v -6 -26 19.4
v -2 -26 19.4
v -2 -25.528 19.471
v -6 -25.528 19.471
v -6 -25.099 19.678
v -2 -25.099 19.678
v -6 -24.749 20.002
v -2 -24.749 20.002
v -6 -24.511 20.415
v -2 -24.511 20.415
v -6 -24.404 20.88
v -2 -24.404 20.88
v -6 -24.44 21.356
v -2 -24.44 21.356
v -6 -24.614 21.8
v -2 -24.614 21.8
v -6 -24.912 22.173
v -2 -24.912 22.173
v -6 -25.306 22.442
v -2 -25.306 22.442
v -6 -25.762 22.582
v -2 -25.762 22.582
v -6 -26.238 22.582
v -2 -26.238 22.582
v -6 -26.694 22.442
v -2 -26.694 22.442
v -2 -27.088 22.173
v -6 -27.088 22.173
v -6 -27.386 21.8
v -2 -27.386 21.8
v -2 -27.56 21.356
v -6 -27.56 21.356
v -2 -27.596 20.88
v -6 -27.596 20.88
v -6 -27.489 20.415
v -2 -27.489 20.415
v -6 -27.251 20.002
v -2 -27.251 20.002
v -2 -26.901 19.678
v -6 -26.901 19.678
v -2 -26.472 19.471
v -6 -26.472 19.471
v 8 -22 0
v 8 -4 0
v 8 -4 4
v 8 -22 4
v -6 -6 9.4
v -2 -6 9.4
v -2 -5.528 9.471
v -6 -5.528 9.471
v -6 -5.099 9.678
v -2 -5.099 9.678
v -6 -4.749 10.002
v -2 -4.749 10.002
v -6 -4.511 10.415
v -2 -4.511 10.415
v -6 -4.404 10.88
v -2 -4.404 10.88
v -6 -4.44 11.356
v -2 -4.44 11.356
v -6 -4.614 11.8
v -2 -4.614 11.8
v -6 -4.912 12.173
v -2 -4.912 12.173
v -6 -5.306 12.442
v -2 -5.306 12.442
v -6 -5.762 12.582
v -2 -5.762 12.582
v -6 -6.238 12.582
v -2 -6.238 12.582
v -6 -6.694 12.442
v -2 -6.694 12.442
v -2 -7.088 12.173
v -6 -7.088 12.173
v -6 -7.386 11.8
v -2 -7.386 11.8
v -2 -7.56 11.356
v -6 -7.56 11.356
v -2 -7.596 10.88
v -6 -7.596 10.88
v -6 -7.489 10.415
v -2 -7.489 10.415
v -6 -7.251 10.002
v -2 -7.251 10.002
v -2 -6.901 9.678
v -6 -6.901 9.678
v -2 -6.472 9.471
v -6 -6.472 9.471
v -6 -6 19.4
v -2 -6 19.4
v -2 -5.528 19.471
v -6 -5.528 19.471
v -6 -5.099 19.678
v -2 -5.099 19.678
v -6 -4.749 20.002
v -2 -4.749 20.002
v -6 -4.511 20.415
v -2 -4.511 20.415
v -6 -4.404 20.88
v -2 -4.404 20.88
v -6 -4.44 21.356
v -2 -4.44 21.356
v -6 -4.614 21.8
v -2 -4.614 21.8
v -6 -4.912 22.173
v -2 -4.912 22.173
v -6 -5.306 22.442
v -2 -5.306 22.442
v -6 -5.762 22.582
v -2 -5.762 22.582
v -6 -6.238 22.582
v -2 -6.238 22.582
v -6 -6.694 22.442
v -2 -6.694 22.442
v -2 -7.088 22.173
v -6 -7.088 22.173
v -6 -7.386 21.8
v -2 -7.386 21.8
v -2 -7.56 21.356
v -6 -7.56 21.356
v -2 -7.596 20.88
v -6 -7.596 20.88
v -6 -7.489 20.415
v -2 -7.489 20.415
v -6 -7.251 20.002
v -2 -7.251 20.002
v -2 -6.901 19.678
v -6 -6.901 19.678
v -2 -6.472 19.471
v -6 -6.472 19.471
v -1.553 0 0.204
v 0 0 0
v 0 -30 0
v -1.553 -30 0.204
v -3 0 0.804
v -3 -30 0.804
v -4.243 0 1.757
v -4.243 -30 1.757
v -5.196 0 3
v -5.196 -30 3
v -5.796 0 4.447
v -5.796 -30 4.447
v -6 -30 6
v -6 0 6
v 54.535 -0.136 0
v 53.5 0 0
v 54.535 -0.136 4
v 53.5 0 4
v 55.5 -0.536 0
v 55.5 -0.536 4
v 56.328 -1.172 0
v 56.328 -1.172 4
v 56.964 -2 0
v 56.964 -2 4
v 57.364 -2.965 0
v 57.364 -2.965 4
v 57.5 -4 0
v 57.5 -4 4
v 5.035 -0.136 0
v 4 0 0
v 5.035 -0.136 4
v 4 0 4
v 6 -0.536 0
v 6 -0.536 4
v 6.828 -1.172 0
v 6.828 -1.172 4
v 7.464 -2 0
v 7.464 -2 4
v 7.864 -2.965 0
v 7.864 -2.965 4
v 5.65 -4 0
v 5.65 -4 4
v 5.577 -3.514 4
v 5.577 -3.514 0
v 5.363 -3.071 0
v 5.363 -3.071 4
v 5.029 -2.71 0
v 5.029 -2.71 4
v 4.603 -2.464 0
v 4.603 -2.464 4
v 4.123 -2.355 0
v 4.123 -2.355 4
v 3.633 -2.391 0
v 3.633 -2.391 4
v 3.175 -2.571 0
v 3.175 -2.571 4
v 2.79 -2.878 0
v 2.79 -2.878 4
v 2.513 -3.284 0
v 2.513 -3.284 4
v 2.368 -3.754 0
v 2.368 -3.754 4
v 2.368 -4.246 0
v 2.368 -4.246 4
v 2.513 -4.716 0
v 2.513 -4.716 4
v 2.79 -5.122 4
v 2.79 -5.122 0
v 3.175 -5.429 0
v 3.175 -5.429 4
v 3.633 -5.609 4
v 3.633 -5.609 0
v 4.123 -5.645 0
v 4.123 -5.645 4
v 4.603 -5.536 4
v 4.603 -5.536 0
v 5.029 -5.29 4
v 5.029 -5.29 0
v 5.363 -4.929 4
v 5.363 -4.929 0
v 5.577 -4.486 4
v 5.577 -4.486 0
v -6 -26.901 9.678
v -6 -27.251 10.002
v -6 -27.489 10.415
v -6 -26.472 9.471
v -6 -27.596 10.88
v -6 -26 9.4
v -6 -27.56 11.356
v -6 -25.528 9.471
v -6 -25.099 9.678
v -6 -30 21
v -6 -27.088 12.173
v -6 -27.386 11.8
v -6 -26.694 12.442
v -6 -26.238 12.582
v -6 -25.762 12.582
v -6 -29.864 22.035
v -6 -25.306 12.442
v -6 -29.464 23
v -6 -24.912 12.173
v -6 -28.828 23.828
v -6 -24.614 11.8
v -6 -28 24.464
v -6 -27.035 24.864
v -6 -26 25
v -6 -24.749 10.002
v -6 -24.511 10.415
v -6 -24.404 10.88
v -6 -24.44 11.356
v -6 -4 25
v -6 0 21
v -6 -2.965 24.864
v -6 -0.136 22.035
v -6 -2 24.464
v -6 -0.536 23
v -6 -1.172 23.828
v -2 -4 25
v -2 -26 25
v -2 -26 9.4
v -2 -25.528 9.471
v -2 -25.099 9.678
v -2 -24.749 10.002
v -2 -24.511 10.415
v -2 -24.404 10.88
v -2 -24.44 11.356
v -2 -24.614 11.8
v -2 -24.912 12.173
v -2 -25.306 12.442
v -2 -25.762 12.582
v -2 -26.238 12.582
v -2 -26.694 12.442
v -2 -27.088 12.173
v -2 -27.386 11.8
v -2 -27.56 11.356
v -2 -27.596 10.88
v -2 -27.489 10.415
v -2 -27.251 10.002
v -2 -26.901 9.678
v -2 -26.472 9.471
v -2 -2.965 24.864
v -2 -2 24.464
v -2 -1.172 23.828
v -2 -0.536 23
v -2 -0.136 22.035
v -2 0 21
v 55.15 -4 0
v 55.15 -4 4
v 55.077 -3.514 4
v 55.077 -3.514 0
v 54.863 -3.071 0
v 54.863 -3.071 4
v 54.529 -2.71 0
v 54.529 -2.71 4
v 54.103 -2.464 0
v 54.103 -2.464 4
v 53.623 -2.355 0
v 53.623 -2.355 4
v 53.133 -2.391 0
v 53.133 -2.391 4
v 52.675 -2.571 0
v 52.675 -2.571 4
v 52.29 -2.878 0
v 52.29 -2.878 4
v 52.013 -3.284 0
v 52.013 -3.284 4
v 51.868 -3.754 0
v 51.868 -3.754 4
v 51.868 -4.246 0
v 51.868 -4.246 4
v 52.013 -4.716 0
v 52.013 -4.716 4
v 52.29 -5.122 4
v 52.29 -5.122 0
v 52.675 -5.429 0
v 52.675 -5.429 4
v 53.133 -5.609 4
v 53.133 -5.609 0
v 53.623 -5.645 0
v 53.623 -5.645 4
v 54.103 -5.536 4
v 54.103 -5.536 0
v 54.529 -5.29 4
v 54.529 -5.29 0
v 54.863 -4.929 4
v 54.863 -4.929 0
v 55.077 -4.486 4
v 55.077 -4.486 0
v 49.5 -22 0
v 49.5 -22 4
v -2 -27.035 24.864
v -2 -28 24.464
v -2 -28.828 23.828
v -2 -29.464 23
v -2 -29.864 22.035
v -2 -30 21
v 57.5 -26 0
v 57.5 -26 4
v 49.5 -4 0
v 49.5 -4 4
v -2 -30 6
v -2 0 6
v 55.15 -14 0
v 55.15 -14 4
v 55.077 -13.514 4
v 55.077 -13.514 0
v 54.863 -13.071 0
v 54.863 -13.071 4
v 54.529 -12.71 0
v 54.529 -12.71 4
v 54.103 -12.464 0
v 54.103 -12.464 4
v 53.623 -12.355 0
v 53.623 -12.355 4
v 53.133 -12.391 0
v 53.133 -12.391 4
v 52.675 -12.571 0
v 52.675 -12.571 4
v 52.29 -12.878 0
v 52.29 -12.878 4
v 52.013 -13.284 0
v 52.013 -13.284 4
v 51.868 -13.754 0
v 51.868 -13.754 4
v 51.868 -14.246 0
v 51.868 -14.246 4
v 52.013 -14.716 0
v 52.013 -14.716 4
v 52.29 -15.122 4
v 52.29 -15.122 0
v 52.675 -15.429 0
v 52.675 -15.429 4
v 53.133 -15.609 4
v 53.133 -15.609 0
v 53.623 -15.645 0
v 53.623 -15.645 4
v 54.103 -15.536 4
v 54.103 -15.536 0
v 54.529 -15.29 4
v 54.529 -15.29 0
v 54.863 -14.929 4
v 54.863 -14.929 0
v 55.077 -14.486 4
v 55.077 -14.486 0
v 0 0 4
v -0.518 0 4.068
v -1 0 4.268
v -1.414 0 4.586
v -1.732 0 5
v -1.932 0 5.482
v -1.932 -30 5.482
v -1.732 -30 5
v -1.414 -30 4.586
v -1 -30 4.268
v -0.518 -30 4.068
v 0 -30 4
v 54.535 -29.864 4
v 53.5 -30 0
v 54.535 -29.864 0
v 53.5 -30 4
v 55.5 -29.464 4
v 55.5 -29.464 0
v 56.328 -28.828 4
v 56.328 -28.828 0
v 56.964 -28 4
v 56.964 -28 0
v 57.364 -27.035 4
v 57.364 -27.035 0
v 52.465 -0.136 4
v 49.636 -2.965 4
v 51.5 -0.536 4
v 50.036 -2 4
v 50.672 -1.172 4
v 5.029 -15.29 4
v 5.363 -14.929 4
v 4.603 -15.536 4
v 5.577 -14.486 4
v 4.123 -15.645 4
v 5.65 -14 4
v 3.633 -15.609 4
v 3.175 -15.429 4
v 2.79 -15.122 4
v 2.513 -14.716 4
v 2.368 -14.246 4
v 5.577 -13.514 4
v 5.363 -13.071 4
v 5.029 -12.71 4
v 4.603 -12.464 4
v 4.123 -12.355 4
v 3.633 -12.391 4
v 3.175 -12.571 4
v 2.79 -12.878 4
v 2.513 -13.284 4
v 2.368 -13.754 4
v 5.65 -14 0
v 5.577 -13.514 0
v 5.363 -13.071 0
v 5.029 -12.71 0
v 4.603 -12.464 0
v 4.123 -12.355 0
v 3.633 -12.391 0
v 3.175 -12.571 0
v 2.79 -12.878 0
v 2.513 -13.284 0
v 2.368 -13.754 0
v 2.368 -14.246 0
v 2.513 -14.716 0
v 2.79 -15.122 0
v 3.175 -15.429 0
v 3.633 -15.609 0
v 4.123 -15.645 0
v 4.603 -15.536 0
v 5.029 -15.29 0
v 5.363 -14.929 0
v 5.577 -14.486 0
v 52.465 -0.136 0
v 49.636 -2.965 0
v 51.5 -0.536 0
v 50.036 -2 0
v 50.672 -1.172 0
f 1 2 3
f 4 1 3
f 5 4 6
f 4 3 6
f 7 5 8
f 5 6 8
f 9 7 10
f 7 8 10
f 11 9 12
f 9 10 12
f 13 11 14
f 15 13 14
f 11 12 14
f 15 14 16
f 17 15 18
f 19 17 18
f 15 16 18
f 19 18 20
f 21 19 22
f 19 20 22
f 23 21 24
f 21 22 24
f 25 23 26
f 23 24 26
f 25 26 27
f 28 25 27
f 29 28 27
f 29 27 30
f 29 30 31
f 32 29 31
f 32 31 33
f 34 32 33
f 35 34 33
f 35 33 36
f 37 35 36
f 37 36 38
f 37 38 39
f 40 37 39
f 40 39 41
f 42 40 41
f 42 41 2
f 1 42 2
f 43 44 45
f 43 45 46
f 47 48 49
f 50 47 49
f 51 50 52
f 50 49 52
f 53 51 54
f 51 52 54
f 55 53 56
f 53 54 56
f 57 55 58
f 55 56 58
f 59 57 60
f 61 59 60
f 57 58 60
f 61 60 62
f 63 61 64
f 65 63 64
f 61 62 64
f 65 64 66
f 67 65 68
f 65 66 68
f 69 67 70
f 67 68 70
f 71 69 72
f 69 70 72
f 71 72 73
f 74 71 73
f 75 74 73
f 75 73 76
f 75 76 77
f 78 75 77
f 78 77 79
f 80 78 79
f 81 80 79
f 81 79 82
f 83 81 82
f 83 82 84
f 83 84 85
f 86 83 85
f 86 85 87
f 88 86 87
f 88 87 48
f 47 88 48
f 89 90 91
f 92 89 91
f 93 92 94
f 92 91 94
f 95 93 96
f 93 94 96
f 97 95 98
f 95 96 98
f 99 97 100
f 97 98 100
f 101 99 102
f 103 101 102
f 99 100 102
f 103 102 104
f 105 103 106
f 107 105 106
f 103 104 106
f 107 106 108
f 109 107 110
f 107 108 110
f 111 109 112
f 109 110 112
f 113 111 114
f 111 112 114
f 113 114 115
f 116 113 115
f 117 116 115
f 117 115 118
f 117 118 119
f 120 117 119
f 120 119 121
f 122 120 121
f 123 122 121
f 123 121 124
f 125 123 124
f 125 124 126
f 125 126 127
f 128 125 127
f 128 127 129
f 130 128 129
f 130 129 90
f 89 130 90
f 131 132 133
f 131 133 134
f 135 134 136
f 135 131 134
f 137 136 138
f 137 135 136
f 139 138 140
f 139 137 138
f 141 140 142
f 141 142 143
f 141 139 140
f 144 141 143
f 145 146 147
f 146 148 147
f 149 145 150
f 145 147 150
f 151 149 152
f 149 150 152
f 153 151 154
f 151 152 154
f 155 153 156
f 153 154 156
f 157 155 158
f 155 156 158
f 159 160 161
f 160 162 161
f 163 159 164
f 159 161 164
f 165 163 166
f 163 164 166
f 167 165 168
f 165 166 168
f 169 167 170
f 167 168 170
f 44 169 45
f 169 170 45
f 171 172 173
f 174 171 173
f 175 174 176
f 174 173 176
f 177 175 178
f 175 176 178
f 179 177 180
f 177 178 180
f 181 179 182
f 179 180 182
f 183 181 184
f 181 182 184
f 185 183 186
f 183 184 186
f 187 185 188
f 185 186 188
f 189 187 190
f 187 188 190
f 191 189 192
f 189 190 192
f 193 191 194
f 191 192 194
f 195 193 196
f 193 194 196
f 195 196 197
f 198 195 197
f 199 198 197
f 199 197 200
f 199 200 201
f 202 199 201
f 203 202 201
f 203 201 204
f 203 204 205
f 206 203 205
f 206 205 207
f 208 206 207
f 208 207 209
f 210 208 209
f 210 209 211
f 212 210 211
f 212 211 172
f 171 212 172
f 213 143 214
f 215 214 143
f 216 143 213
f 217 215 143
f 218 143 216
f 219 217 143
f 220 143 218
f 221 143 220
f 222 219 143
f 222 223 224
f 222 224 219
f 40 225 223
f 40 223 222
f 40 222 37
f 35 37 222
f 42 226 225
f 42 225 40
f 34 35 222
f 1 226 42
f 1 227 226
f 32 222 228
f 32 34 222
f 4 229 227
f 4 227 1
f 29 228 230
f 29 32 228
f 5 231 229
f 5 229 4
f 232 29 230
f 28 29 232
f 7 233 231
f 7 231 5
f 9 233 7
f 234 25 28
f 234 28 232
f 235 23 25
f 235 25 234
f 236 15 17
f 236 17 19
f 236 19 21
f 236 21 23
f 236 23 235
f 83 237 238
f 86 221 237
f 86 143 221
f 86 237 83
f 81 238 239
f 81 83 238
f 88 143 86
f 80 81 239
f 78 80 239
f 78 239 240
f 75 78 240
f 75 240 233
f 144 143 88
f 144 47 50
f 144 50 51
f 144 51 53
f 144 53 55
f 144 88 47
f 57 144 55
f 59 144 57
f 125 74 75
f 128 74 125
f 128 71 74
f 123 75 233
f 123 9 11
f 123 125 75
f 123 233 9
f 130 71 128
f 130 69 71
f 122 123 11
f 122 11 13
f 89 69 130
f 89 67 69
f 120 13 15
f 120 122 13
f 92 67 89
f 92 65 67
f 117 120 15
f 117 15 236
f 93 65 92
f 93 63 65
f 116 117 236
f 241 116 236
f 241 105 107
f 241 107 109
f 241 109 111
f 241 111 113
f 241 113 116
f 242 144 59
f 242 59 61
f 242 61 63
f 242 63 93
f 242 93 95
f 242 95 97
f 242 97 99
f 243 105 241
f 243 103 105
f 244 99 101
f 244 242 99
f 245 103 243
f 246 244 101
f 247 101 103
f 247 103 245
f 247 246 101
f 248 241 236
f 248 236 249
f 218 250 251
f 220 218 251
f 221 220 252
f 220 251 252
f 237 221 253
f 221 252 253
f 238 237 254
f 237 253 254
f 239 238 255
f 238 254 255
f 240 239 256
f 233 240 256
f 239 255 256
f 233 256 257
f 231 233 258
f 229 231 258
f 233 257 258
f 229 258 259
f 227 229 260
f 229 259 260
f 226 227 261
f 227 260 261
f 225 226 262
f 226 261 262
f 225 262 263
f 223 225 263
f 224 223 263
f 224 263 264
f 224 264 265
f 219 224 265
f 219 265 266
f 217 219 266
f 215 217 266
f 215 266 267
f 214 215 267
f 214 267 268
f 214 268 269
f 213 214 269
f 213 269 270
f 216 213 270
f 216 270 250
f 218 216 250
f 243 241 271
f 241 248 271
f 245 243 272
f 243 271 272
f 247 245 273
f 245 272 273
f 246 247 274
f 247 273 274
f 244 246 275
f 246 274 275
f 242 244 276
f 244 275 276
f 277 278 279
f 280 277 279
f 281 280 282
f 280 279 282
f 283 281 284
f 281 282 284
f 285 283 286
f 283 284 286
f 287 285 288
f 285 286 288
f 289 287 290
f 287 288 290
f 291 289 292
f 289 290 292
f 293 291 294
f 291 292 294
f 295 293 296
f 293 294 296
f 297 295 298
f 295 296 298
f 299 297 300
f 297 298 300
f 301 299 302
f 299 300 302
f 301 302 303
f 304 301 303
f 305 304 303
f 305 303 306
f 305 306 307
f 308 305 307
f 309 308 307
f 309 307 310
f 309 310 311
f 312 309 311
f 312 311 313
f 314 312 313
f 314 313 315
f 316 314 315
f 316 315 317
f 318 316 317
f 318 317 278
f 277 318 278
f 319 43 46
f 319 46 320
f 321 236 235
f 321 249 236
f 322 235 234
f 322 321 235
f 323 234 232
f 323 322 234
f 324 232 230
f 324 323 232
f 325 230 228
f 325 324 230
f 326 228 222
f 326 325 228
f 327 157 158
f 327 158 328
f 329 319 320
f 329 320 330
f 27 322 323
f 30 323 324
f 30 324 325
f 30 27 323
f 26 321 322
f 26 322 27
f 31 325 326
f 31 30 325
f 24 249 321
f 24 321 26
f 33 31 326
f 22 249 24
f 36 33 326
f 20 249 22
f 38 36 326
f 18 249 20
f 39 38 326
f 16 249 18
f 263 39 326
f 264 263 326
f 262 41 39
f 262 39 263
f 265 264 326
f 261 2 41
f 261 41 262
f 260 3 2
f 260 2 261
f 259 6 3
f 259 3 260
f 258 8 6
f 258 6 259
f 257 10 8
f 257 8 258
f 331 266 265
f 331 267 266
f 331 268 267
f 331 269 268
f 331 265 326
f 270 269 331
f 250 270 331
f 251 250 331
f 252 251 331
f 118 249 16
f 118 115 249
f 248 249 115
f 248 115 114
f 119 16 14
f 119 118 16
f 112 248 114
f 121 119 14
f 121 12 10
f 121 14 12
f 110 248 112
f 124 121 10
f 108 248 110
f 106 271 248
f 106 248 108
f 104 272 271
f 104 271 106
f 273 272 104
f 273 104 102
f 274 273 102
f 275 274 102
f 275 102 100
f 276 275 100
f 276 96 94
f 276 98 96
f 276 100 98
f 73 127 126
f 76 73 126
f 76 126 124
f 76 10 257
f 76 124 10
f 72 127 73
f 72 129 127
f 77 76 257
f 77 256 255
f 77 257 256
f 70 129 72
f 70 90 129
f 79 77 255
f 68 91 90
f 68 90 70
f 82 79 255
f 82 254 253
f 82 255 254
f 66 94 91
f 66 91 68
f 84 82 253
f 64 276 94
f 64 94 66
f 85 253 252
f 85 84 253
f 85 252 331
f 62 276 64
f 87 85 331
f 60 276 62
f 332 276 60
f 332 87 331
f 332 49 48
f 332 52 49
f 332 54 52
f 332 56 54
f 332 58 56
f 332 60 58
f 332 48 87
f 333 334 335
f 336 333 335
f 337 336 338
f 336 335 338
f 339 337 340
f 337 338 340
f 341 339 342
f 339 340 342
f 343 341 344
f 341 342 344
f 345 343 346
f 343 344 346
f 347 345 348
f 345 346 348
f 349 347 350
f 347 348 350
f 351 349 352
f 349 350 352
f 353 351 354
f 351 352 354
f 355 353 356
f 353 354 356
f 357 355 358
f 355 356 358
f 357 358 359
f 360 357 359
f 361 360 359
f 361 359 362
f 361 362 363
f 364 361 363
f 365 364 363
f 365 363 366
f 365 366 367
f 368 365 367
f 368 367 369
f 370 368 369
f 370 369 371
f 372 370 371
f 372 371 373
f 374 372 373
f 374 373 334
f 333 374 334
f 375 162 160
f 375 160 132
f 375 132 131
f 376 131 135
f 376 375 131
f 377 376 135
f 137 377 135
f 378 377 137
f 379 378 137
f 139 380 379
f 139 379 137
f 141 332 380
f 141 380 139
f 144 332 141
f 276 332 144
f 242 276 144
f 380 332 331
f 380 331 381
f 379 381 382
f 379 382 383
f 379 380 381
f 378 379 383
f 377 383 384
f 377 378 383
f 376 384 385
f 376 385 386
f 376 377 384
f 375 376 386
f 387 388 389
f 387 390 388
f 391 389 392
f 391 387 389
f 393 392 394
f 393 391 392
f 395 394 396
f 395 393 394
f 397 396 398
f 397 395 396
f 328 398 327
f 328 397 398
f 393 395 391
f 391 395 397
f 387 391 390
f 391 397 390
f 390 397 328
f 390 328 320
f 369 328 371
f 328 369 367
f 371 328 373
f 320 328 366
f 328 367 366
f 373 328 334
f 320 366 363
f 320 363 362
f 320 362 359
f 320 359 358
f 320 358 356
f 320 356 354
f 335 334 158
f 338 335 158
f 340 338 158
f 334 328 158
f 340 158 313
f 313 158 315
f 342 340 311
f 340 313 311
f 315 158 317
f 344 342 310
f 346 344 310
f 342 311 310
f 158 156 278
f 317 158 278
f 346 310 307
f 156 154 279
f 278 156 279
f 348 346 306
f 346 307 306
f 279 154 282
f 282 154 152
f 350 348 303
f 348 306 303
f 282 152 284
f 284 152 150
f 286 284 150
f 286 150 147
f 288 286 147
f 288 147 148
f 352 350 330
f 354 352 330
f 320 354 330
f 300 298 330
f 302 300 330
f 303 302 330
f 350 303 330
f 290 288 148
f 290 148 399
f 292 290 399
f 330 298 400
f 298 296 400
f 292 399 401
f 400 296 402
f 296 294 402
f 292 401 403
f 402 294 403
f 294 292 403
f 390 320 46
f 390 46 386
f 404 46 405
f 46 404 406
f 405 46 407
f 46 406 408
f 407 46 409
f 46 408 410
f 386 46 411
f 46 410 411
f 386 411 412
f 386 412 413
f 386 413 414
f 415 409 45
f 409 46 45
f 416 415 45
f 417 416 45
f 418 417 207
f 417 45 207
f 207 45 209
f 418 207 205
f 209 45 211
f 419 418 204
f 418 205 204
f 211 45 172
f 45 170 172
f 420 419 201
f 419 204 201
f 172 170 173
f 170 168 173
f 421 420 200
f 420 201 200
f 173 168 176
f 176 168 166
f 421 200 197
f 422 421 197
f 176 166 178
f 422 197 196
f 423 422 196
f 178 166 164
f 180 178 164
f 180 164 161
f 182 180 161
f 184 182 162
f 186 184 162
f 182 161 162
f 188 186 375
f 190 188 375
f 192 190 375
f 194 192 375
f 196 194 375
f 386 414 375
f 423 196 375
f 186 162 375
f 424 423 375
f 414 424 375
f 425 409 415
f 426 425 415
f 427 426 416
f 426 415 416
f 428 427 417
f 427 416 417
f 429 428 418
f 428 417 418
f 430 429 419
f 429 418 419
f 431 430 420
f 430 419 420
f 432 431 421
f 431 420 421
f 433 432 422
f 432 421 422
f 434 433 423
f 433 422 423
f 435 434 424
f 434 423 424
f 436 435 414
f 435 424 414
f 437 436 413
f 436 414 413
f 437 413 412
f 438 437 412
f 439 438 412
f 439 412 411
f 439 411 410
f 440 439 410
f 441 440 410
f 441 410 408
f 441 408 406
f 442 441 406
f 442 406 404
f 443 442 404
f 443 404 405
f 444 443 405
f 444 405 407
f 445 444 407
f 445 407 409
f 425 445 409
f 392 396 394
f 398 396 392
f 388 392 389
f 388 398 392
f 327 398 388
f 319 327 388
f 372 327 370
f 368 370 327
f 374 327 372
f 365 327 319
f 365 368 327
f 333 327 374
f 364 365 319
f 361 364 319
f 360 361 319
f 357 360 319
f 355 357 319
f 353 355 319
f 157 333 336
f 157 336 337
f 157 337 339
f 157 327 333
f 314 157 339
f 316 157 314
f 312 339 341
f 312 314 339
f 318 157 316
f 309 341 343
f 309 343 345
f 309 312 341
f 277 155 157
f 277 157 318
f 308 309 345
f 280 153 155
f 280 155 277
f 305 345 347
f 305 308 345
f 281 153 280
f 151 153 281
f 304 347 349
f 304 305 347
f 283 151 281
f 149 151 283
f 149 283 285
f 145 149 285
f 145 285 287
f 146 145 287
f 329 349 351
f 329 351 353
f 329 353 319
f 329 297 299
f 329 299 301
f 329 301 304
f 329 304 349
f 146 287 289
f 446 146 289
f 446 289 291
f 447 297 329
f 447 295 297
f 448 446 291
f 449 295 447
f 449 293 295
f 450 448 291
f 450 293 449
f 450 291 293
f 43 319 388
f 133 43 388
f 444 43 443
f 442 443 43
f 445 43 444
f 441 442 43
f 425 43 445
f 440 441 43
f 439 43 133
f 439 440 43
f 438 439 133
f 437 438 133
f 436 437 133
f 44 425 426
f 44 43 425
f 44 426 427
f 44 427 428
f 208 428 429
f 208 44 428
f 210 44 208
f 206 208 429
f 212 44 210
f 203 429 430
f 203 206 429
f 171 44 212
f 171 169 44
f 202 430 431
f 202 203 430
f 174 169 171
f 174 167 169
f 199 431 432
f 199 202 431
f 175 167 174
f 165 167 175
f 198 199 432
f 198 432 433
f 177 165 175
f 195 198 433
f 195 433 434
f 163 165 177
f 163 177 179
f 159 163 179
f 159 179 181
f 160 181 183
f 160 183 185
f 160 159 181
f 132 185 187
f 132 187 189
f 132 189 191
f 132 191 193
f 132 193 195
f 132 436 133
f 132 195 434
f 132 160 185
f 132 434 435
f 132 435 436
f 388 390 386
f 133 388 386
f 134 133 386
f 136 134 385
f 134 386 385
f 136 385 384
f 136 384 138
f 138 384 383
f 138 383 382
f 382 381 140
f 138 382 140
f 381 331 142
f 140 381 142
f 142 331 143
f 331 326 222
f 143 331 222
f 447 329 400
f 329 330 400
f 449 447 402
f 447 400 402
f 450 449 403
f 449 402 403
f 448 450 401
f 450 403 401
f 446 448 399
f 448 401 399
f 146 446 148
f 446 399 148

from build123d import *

# Parameters (mm, degrees)
EXTRUDE_1_DEPTH        = 4
SM_EDGE_FLANGE_1_DEPTH = 30
FILLET_1_R             = 4
SKETCH_27_R            = 1.6
CUT_EXTRUDE_1_DEPTH    = 10
M4X0_7_1_D             = 3.3


# Sheet-metal steps are written as plain solids
with BuildPart() as part:
    # Sketch 1 → 填料-伸長1 (new body)
    with BuildSketch(Plane.XY):
        Polygon((8, 0), (8, -22), (49.5, -22), (49.5, 0), (57.5, 0), (57.5, -30), (8, -30), (0, -30), (0, 0), align=None)
    extrude(amount=EXTRUDE_1_DEPTH)

    # 邊線-凸緣1 section (across the edge) → 邊線-凸緣1 (add)
    with BuildSketch(Plane(origin=(-2, 0, 4), x_dir=(1, 0, 0), z_dir=(0, -1, 0))):
        with BuildLine():
            Line((-4, 2), (-4, 21))
            Line((-4, 21), (0, 21))
            Line((0, 21), (0, 2))
            ThreePointArc((0, 2), (0.585786438, 0.585786438), (2, 0))
            Line((2, 0), (2, -4))
            ThreePointArc((2, -4), (-2.242640687, -2.242640687), (-4, 2))
        make_face()
    extrude(amount=SM_EDGE_FLANGE_1_DEPTH)

    # 圓角1
    fillet_1_edges = [part.edges().sort_by_distance(p)[0] for p in [
        (57.5, -30, 2),
        (57.5, 0, 2),
        (49.5, 0, 2),
        (8, 0, 2),
        (-4, 0, 25),
        (-4, -30, 25),
    ]]
    fillet(fillet_1_edges, radius=FILLET_1_R - 0.0001)  # a hair under: the kernel refuses the full size

    # 草圖27 → 除料-伸長1 (cut)
    with BuildSketch(Plane(origin=(-2, 0, 0), x_dir=(0, 0, -1), z_dir=(1, 0, 0))):
        with Locations((-21, -26)):
            Circle(SKETCH_27_R)
        with Locations((-11, -26)):
            Circle(SKETCH_27_R)
        with Locations((-11, -6)):
            Circle(SKETCH_27_R)
        with Locations((-21, -6)):
            Circle(SKETCH_27_R)
    extrude(amount=-CUT_EXTRUDE_1_DEPTH, mode=Mode.SUBTRACT)

    # M4x0.7 螺紋孔1 (through all)
    with Locations(Plane(origin=(53.5, -4, 0), x_dir=(-1, 0, 0), z_dir=(0, 0, -1))):
        with Locations((0, 0), (0, -10), (49.5, 0), (49.5, -10)):
            Hole(M4X0_7_1_D / 2)


solid = part.part
